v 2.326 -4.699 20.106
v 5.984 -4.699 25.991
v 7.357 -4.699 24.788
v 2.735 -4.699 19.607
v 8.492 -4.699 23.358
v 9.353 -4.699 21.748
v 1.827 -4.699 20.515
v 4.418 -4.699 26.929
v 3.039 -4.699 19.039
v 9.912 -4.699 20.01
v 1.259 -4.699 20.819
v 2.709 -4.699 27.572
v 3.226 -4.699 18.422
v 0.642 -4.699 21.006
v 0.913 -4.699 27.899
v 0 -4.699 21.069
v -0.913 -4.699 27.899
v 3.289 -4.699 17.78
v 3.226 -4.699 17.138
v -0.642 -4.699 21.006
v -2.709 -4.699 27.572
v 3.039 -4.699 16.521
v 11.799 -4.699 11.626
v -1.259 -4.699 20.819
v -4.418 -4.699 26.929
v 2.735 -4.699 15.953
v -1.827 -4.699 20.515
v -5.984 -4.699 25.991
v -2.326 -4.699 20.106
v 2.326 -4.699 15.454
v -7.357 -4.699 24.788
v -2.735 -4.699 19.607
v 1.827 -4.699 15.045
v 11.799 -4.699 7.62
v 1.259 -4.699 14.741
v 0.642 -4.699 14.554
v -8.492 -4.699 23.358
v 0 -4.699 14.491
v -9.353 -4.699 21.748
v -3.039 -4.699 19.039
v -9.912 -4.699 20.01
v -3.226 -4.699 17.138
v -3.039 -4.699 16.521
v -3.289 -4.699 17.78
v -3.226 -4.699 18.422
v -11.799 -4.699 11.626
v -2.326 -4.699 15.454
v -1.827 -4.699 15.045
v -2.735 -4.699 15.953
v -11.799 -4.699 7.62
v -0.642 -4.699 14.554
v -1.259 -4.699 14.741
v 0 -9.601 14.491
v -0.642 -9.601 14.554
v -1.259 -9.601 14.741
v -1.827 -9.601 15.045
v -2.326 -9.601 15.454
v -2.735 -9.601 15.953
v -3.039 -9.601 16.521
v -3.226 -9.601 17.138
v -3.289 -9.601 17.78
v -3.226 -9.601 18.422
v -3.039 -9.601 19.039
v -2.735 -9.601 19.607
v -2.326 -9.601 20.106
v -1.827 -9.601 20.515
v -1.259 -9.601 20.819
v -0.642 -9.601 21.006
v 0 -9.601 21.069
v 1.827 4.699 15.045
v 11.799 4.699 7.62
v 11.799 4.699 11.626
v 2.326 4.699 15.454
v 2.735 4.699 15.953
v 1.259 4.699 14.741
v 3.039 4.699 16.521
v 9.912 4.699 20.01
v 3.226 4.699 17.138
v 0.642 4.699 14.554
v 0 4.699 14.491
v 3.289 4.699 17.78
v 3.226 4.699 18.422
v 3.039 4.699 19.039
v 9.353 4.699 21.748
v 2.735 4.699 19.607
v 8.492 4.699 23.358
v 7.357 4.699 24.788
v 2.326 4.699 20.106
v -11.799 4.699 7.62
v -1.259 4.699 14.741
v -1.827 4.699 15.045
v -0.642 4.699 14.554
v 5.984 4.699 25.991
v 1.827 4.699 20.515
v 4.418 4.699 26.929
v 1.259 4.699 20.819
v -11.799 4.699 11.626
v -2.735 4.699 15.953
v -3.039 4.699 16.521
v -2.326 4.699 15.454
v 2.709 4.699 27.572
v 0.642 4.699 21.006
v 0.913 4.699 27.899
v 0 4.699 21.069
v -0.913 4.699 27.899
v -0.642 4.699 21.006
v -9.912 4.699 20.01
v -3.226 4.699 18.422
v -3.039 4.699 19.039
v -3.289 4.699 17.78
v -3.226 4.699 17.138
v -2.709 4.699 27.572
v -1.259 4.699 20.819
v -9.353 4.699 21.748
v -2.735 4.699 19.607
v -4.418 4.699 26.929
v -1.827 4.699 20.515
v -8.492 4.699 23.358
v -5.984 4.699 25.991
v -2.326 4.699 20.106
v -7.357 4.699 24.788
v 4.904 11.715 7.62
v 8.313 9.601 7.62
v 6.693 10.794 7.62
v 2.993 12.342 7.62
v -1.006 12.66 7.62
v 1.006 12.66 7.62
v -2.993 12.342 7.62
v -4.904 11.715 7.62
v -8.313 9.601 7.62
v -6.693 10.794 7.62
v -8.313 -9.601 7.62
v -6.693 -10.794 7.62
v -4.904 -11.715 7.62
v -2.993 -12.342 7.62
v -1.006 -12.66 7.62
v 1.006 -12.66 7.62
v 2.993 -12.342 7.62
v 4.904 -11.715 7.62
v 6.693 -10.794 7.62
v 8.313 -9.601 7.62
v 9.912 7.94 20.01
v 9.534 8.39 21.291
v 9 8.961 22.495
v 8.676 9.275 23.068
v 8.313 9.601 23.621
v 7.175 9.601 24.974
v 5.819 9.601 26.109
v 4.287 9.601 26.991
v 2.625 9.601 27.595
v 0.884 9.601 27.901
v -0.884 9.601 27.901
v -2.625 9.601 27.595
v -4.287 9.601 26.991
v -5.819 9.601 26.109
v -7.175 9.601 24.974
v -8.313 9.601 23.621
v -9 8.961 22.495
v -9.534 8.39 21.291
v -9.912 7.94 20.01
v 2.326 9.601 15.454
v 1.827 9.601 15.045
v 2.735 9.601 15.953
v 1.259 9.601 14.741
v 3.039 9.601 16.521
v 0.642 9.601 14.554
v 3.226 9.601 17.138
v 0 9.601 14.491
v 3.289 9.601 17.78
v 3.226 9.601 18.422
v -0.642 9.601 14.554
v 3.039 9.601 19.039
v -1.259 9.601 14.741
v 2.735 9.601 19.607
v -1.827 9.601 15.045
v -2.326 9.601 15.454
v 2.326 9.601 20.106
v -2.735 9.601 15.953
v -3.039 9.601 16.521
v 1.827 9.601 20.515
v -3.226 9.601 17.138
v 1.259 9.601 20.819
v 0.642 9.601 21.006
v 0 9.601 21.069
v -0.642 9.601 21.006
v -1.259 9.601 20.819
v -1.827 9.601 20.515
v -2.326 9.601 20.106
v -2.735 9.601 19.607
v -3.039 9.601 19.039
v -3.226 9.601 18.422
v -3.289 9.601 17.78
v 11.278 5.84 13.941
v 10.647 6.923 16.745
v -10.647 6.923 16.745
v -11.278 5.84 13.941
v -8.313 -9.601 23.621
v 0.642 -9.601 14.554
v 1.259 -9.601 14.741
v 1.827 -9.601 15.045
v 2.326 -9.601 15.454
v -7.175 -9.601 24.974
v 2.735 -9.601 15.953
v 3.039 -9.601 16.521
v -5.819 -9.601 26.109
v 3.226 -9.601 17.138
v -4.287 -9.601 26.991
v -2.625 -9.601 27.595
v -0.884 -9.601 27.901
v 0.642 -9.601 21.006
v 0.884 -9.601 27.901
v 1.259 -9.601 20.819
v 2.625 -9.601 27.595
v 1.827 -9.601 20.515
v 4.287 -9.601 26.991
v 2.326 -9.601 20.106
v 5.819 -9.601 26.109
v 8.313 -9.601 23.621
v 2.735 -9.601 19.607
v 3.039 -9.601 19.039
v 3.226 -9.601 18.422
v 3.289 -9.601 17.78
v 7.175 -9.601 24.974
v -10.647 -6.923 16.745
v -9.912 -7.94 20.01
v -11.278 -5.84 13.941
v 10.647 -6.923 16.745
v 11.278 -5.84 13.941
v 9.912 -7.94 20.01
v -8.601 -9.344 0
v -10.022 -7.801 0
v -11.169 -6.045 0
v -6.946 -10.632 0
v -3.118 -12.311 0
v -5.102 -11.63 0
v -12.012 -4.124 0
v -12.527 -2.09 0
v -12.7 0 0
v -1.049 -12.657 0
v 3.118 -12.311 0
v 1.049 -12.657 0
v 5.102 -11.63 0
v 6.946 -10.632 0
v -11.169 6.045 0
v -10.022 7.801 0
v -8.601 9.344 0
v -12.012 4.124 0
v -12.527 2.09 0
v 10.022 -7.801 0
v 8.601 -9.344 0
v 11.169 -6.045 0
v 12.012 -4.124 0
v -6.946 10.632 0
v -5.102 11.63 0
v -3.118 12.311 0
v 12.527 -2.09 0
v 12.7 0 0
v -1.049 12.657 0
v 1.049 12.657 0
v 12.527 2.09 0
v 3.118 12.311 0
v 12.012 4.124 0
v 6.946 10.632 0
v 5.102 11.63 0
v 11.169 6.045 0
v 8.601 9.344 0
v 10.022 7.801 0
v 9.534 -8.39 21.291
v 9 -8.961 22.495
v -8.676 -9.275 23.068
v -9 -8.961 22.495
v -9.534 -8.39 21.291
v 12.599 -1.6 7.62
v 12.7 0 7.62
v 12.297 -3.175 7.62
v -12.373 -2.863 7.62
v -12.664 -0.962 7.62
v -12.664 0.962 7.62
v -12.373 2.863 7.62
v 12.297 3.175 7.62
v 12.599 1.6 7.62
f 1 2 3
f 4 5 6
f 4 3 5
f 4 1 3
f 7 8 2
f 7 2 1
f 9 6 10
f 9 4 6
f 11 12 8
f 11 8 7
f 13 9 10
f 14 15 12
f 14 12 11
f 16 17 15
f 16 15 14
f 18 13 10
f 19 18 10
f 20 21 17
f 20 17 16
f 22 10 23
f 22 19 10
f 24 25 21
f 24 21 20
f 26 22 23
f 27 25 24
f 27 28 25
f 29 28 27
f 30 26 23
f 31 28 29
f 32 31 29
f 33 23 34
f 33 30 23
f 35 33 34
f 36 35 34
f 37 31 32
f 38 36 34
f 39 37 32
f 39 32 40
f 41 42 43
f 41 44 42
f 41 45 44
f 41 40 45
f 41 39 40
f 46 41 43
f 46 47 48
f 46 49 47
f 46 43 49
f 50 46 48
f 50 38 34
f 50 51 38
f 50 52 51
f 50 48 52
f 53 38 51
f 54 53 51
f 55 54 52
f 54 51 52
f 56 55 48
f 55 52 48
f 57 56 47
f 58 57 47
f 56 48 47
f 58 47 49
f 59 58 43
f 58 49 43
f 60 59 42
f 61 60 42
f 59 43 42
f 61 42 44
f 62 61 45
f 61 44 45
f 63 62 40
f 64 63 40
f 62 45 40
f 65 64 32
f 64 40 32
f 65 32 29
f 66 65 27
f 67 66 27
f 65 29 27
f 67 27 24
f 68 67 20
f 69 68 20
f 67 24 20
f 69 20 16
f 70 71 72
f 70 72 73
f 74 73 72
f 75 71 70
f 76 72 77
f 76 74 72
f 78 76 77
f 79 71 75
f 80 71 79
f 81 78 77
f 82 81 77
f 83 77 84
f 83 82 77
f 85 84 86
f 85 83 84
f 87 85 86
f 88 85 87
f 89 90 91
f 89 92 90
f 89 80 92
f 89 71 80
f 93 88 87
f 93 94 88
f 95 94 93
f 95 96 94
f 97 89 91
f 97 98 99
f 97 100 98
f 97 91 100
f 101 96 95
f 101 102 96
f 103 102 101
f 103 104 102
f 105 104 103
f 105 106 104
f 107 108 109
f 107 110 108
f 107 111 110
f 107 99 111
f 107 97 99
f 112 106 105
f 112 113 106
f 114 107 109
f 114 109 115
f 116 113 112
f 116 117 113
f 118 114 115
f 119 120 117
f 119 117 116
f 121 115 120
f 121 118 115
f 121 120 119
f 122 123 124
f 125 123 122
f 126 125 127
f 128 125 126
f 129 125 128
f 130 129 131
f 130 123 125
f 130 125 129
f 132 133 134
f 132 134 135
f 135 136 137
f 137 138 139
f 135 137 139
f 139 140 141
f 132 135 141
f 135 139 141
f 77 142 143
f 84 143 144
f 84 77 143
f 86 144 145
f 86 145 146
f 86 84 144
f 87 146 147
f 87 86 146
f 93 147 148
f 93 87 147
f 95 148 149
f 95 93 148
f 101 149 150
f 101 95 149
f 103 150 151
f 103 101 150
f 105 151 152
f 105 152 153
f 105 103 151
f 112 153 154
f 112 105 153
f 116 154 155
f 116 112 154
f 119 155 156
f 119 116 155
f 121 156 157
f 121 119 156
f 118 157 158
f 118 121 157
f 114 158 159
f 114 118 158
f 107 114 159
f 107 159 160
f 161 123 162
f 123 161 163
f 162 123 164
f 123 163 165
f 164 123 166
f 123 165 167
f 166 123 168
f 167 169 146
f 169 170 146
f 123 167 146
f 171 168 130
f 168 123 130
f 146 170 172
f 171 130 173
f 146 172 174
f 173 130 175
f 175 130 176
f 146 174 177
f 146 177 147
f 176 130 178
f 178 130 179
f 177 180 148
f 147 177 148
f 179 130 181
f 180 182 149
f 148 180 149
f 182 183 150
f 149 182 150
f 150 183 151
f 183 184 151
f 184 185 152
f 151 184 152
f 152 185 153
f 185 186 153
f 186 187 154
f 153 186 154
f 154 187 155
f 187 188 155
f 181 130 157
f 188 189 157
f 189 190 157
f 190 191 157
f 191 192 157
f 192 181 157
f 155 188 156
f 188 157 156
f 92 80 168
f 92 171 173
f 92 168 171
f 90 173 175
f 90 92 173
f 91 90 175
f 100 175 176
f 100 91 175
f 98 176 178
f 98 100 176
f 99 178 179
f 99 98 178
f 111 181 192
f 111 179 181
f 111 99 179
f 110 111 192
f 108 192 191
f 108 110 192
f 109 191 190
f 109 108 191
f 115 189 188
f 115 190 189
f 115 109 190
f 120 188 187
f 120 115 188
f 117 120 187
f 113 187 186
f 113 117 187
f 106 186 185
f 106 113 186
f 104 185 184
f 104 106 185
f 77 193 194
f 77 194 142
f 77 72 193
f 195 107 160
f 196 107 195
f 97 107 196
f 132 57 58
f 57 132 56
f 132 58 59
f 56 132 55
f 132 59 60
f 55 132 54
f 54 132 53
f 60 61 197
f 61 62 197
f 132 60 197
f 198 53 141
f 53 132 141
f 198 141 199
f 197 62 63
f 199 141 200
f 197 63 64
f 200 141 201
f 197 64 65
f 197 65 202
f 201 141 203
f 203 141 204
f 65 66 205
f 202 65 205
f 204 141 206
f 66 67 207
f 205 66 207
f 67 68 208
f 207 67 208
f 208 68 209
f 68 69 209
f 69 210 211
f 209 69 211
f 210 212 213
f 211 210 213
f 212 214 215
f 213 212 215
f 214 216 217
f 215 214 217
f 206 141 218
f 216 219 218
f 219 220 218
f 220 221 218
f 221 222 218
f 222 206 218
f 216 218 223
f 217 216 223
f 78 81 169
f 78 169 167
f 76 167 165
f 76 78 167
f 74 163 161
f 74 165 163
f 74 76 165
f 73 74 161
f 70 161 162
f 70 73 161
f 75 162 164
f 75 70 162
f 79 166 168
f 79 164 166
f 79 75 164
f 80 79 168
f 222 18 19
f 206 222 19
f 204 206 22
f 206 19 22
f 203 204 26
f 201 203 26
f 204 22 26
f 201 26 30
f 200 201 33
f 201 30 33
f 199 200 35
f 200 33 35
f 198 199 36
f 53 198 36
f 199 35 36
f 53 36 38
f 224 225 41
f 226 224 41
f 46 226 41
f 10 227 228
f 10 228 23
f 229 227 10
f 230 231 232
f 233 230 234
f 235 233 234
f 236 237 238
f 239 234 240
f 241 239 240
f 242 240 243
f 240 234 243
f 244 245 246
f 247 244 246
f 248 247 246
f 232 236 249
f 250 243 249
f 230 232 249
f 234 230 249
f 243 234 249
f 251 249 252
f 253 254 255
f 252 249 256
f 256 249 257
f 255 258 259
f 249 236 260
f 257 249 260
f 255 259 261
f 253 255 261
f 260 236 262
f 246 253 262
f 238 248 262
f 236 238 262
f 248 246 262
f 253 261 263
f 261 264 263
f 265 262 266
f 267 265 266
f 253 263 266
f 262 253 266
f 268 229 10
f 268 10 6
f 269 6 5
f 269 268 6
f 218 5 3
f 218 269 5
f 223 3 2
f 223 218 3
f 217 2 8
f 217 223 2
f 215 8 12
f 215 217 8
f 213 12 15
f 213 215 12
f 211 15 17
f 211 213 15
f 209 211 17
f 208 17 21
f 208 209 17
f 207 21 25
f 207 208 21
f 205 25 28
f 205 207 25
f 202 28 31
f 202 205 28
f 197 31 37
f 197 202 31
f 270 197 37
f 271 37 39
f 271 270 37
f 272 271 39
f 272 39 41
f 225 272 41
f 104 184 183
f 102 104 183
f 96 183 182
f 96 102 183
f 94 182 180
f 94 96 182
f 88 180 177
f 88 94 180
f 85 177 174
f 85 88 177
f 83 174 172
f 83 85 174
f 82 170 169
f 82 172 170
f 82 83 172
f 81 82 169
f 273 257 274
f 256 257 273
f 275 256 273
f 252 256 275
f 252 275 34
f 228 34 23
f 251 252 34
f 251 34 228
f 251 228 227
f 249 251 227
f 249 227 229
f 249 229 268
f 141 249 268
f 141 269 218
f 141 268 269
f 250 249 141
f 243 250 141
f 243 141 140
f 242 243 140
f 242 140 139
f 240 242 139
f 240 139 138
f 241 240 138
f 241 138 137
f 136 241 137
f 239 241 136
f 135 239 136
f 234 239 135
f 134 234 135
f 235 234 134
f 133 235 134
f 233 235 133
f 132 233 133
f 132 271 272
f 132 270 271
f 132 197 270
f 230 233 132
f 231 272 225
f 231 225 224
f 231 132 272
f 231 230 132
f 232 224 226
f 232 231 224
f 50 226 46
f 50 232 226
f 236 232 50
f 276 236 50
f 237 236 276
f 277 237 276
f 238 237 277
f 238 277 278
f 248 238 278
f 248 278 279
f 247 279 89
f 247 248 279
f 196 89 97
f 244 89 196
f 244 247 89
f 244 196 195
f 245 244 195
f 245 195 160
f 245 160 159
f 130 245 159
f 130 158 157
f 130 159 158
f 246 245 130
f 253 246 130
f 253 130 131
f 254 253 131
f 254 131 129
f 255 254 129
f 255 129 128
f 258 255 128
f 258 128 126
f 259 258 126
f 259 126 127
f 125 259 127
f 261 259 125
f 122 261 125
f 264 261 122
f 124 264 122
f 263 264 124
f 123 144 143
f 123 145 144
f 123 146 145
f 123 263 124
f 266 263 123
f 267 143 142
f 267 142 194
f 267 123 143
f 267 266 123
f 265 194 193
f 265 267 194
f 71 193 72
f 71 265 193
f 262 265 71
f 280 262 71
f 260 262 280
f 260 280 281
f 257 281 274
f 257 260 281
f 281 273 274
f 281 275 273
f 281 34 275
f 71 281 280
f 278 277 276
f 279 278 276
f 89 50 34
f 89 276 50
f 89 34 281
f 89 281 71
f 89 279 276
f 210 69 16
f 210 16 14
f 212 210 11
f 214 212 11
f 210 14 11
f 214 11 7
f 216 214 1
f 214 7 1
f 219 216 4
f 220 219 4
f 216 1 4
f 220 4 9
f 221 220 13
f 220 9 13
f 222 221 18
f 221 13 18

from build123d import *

# Parameters (mm, degrees)
F0_R     = 12.7
F1_DEPTH = 7.62
F3_DEPTH = 12.7
F4_W     = 3.0988
F4_H     = 21.7537892061
F4_H_2   = 20.3239873993
F5_DEPTH = 12.7
F6_DEPTH = 12.7
F7_DEPTH = 25.4
F8_DEPTH = 12.7


with BuildPart() as f1:
    # F0 (on Top) → F1 (new body)
    with BuildSketch(Plane.XY):
        Circle(F0_R)
    extrude(amount=F1_DEPTH)

    # F2 (on Front) → F3 (cut, symmetric)
    with BuildSketch(Plane.XZ):
        with BuildLine():
            ThreePointArc((0, 21.0693), (-3.2893, 17.78), (0, 14.4907))
            Line((0, 14.4907), (0, 21.0693))
        make_face()
        with BuildLine():
            Line((0, 21.0693), (0, 14.4907))
            ThreePointArc((0, 14.4907), (2.3258863354, 15.4541136646), (3.2893, 17.78))
            ThreePointArc((3.2893, 17.78), (2.3258863354, 20.1058863354), (0, 21.0693))
        make_face()
    extrude(amount=F3_DEPTH, both=True, mode=Mode.SUBTRACT)

    # F4 (on Right) → F5 (cut, symmetric)
    with BuildSketch(Plane.YZ):
        with Locations((11.1506, 18.4968946031)):
            Rectangle(F4_W, F4_H)
        Polygon((-4.699, 7.62), (0, 7.62), (4.699, 7.62), (4.699, 28.9018824697), (0, 28.9018824697), (-4.699, 28.9018824697), (-4.699, 27.9439873993), align=None)
        with Locations((-11.1506, 17.7819936997)):
            Rectangle(F4_W, F4_H_2)
    extrude(amount=F5_DEPTH, both=True, mode=Mode.SUBTRACT)

    # F2 (on Front) → F6 (join, symmetric)
    with BuildSketch(Plane.XZ):
        with BuildLine():
            ThreePointArc((0, 7.62), (7.1842048969, 10.5957951031), (10.16, 17.78))
            ThreePointArc((10.16, 17.78), (10.0978587443, 18.9019843049), (9.912195122, 20.0102439024))
            ThreePointArc((9.912195122, 20.0102439024), (6.3469016832, 25.7136271039), (0, 27.94))
            Line((0, 27.94), (0, 21.0693))
            ThreePointArc((0, 21.0693), (2.3258863354, 20.1058863354), (3.2893, 17.78))
            ThreePointArc((3.2893, 17.78), (2.3258863354, 15.4541136646), (0, 14.4907))
            Line((0, 14.4907), (0, 7.62))
        make_face()
        with BuildLine():
            ThreePointArc((9.912195122, 20.0102439024), (10.0978587443, 18.9019843049), (10.16, 17.78))
            ThreePointArc((10.16, 17.78), (7.1842048969, 10.5957951031), (0, 7.62))
            Line((0, 7.62), (12.7, 7.62))
            Line((12.7, 7.62), (9.912195122, 20.0102439024))
        make_face()
        with BuildLine():
            Line((-12.7, 7.62), (0, 7.62))
            ThreePointArc((0, 7.62), (-7.9336271039, 11.4330983168), (-9.912195122, 20.0102439024))
            Line((-9.912195122, 20.0102439024), (-12.7, 7.62))
        make_face()
        with BuildLine():
            ThreePointArc((-9.912195122, 20.0102439024), (-7.9336271039, 11.4330983168), (0, 7.62))
            Line((0, 7.62), (0, 14.4907))
            ThreePointArc((0, 14.4907), (-3.2893, 17.78), (0, 21.0693))
            Line((0, 21.0693), (0, 27.94))
            ThreePointArc((0, 27.94), (-6.3469016832, 25.7136271039), (-9.912195122, 20.0102439024))
        make_face()
    extrude(amount=F6_DEPTH, both=True)

    # F7 (cut): faces of the model
    f7_faces = [f1.faces().sort_by_distance(p)[0] for p in [
        (-9.8632271754, 9.8632271754, 7.62),
        (9.8632271754, 9.8632271754, 7.62),
        (9.8632271754, -9.8632271754, 7.62),
        (-9.8632271754, -9.8632271754, 7.62),
    ]]
    extrude(f7_faces, amount=-F7_DEPTH, mode=Mode.SUBTRACT)

    # F4 (on Right) → F8 (cut, symmetric)
    with BuildSketch(Plane.YZ):
        with Locations((11.1506, 18.4968946031)):
            Rectangle(F4_W, F4_H)
        Polygon((-4.699, 7.62), (0, 7.62), (4.699, 7.62), (4.699, 28.9018824697), (0, 28.9018824697), (-4.699, 28.9018824697), (-4.699, 27.9439873993), align=None)
        with Locations((-11.1506, 17.7819936997)):
            Rectangle(F4_W, F4_H_2)
    extrude(amount=F8_DEPTH, both=True, mode=Mode.SUBTRACT)


solid = f1.part
